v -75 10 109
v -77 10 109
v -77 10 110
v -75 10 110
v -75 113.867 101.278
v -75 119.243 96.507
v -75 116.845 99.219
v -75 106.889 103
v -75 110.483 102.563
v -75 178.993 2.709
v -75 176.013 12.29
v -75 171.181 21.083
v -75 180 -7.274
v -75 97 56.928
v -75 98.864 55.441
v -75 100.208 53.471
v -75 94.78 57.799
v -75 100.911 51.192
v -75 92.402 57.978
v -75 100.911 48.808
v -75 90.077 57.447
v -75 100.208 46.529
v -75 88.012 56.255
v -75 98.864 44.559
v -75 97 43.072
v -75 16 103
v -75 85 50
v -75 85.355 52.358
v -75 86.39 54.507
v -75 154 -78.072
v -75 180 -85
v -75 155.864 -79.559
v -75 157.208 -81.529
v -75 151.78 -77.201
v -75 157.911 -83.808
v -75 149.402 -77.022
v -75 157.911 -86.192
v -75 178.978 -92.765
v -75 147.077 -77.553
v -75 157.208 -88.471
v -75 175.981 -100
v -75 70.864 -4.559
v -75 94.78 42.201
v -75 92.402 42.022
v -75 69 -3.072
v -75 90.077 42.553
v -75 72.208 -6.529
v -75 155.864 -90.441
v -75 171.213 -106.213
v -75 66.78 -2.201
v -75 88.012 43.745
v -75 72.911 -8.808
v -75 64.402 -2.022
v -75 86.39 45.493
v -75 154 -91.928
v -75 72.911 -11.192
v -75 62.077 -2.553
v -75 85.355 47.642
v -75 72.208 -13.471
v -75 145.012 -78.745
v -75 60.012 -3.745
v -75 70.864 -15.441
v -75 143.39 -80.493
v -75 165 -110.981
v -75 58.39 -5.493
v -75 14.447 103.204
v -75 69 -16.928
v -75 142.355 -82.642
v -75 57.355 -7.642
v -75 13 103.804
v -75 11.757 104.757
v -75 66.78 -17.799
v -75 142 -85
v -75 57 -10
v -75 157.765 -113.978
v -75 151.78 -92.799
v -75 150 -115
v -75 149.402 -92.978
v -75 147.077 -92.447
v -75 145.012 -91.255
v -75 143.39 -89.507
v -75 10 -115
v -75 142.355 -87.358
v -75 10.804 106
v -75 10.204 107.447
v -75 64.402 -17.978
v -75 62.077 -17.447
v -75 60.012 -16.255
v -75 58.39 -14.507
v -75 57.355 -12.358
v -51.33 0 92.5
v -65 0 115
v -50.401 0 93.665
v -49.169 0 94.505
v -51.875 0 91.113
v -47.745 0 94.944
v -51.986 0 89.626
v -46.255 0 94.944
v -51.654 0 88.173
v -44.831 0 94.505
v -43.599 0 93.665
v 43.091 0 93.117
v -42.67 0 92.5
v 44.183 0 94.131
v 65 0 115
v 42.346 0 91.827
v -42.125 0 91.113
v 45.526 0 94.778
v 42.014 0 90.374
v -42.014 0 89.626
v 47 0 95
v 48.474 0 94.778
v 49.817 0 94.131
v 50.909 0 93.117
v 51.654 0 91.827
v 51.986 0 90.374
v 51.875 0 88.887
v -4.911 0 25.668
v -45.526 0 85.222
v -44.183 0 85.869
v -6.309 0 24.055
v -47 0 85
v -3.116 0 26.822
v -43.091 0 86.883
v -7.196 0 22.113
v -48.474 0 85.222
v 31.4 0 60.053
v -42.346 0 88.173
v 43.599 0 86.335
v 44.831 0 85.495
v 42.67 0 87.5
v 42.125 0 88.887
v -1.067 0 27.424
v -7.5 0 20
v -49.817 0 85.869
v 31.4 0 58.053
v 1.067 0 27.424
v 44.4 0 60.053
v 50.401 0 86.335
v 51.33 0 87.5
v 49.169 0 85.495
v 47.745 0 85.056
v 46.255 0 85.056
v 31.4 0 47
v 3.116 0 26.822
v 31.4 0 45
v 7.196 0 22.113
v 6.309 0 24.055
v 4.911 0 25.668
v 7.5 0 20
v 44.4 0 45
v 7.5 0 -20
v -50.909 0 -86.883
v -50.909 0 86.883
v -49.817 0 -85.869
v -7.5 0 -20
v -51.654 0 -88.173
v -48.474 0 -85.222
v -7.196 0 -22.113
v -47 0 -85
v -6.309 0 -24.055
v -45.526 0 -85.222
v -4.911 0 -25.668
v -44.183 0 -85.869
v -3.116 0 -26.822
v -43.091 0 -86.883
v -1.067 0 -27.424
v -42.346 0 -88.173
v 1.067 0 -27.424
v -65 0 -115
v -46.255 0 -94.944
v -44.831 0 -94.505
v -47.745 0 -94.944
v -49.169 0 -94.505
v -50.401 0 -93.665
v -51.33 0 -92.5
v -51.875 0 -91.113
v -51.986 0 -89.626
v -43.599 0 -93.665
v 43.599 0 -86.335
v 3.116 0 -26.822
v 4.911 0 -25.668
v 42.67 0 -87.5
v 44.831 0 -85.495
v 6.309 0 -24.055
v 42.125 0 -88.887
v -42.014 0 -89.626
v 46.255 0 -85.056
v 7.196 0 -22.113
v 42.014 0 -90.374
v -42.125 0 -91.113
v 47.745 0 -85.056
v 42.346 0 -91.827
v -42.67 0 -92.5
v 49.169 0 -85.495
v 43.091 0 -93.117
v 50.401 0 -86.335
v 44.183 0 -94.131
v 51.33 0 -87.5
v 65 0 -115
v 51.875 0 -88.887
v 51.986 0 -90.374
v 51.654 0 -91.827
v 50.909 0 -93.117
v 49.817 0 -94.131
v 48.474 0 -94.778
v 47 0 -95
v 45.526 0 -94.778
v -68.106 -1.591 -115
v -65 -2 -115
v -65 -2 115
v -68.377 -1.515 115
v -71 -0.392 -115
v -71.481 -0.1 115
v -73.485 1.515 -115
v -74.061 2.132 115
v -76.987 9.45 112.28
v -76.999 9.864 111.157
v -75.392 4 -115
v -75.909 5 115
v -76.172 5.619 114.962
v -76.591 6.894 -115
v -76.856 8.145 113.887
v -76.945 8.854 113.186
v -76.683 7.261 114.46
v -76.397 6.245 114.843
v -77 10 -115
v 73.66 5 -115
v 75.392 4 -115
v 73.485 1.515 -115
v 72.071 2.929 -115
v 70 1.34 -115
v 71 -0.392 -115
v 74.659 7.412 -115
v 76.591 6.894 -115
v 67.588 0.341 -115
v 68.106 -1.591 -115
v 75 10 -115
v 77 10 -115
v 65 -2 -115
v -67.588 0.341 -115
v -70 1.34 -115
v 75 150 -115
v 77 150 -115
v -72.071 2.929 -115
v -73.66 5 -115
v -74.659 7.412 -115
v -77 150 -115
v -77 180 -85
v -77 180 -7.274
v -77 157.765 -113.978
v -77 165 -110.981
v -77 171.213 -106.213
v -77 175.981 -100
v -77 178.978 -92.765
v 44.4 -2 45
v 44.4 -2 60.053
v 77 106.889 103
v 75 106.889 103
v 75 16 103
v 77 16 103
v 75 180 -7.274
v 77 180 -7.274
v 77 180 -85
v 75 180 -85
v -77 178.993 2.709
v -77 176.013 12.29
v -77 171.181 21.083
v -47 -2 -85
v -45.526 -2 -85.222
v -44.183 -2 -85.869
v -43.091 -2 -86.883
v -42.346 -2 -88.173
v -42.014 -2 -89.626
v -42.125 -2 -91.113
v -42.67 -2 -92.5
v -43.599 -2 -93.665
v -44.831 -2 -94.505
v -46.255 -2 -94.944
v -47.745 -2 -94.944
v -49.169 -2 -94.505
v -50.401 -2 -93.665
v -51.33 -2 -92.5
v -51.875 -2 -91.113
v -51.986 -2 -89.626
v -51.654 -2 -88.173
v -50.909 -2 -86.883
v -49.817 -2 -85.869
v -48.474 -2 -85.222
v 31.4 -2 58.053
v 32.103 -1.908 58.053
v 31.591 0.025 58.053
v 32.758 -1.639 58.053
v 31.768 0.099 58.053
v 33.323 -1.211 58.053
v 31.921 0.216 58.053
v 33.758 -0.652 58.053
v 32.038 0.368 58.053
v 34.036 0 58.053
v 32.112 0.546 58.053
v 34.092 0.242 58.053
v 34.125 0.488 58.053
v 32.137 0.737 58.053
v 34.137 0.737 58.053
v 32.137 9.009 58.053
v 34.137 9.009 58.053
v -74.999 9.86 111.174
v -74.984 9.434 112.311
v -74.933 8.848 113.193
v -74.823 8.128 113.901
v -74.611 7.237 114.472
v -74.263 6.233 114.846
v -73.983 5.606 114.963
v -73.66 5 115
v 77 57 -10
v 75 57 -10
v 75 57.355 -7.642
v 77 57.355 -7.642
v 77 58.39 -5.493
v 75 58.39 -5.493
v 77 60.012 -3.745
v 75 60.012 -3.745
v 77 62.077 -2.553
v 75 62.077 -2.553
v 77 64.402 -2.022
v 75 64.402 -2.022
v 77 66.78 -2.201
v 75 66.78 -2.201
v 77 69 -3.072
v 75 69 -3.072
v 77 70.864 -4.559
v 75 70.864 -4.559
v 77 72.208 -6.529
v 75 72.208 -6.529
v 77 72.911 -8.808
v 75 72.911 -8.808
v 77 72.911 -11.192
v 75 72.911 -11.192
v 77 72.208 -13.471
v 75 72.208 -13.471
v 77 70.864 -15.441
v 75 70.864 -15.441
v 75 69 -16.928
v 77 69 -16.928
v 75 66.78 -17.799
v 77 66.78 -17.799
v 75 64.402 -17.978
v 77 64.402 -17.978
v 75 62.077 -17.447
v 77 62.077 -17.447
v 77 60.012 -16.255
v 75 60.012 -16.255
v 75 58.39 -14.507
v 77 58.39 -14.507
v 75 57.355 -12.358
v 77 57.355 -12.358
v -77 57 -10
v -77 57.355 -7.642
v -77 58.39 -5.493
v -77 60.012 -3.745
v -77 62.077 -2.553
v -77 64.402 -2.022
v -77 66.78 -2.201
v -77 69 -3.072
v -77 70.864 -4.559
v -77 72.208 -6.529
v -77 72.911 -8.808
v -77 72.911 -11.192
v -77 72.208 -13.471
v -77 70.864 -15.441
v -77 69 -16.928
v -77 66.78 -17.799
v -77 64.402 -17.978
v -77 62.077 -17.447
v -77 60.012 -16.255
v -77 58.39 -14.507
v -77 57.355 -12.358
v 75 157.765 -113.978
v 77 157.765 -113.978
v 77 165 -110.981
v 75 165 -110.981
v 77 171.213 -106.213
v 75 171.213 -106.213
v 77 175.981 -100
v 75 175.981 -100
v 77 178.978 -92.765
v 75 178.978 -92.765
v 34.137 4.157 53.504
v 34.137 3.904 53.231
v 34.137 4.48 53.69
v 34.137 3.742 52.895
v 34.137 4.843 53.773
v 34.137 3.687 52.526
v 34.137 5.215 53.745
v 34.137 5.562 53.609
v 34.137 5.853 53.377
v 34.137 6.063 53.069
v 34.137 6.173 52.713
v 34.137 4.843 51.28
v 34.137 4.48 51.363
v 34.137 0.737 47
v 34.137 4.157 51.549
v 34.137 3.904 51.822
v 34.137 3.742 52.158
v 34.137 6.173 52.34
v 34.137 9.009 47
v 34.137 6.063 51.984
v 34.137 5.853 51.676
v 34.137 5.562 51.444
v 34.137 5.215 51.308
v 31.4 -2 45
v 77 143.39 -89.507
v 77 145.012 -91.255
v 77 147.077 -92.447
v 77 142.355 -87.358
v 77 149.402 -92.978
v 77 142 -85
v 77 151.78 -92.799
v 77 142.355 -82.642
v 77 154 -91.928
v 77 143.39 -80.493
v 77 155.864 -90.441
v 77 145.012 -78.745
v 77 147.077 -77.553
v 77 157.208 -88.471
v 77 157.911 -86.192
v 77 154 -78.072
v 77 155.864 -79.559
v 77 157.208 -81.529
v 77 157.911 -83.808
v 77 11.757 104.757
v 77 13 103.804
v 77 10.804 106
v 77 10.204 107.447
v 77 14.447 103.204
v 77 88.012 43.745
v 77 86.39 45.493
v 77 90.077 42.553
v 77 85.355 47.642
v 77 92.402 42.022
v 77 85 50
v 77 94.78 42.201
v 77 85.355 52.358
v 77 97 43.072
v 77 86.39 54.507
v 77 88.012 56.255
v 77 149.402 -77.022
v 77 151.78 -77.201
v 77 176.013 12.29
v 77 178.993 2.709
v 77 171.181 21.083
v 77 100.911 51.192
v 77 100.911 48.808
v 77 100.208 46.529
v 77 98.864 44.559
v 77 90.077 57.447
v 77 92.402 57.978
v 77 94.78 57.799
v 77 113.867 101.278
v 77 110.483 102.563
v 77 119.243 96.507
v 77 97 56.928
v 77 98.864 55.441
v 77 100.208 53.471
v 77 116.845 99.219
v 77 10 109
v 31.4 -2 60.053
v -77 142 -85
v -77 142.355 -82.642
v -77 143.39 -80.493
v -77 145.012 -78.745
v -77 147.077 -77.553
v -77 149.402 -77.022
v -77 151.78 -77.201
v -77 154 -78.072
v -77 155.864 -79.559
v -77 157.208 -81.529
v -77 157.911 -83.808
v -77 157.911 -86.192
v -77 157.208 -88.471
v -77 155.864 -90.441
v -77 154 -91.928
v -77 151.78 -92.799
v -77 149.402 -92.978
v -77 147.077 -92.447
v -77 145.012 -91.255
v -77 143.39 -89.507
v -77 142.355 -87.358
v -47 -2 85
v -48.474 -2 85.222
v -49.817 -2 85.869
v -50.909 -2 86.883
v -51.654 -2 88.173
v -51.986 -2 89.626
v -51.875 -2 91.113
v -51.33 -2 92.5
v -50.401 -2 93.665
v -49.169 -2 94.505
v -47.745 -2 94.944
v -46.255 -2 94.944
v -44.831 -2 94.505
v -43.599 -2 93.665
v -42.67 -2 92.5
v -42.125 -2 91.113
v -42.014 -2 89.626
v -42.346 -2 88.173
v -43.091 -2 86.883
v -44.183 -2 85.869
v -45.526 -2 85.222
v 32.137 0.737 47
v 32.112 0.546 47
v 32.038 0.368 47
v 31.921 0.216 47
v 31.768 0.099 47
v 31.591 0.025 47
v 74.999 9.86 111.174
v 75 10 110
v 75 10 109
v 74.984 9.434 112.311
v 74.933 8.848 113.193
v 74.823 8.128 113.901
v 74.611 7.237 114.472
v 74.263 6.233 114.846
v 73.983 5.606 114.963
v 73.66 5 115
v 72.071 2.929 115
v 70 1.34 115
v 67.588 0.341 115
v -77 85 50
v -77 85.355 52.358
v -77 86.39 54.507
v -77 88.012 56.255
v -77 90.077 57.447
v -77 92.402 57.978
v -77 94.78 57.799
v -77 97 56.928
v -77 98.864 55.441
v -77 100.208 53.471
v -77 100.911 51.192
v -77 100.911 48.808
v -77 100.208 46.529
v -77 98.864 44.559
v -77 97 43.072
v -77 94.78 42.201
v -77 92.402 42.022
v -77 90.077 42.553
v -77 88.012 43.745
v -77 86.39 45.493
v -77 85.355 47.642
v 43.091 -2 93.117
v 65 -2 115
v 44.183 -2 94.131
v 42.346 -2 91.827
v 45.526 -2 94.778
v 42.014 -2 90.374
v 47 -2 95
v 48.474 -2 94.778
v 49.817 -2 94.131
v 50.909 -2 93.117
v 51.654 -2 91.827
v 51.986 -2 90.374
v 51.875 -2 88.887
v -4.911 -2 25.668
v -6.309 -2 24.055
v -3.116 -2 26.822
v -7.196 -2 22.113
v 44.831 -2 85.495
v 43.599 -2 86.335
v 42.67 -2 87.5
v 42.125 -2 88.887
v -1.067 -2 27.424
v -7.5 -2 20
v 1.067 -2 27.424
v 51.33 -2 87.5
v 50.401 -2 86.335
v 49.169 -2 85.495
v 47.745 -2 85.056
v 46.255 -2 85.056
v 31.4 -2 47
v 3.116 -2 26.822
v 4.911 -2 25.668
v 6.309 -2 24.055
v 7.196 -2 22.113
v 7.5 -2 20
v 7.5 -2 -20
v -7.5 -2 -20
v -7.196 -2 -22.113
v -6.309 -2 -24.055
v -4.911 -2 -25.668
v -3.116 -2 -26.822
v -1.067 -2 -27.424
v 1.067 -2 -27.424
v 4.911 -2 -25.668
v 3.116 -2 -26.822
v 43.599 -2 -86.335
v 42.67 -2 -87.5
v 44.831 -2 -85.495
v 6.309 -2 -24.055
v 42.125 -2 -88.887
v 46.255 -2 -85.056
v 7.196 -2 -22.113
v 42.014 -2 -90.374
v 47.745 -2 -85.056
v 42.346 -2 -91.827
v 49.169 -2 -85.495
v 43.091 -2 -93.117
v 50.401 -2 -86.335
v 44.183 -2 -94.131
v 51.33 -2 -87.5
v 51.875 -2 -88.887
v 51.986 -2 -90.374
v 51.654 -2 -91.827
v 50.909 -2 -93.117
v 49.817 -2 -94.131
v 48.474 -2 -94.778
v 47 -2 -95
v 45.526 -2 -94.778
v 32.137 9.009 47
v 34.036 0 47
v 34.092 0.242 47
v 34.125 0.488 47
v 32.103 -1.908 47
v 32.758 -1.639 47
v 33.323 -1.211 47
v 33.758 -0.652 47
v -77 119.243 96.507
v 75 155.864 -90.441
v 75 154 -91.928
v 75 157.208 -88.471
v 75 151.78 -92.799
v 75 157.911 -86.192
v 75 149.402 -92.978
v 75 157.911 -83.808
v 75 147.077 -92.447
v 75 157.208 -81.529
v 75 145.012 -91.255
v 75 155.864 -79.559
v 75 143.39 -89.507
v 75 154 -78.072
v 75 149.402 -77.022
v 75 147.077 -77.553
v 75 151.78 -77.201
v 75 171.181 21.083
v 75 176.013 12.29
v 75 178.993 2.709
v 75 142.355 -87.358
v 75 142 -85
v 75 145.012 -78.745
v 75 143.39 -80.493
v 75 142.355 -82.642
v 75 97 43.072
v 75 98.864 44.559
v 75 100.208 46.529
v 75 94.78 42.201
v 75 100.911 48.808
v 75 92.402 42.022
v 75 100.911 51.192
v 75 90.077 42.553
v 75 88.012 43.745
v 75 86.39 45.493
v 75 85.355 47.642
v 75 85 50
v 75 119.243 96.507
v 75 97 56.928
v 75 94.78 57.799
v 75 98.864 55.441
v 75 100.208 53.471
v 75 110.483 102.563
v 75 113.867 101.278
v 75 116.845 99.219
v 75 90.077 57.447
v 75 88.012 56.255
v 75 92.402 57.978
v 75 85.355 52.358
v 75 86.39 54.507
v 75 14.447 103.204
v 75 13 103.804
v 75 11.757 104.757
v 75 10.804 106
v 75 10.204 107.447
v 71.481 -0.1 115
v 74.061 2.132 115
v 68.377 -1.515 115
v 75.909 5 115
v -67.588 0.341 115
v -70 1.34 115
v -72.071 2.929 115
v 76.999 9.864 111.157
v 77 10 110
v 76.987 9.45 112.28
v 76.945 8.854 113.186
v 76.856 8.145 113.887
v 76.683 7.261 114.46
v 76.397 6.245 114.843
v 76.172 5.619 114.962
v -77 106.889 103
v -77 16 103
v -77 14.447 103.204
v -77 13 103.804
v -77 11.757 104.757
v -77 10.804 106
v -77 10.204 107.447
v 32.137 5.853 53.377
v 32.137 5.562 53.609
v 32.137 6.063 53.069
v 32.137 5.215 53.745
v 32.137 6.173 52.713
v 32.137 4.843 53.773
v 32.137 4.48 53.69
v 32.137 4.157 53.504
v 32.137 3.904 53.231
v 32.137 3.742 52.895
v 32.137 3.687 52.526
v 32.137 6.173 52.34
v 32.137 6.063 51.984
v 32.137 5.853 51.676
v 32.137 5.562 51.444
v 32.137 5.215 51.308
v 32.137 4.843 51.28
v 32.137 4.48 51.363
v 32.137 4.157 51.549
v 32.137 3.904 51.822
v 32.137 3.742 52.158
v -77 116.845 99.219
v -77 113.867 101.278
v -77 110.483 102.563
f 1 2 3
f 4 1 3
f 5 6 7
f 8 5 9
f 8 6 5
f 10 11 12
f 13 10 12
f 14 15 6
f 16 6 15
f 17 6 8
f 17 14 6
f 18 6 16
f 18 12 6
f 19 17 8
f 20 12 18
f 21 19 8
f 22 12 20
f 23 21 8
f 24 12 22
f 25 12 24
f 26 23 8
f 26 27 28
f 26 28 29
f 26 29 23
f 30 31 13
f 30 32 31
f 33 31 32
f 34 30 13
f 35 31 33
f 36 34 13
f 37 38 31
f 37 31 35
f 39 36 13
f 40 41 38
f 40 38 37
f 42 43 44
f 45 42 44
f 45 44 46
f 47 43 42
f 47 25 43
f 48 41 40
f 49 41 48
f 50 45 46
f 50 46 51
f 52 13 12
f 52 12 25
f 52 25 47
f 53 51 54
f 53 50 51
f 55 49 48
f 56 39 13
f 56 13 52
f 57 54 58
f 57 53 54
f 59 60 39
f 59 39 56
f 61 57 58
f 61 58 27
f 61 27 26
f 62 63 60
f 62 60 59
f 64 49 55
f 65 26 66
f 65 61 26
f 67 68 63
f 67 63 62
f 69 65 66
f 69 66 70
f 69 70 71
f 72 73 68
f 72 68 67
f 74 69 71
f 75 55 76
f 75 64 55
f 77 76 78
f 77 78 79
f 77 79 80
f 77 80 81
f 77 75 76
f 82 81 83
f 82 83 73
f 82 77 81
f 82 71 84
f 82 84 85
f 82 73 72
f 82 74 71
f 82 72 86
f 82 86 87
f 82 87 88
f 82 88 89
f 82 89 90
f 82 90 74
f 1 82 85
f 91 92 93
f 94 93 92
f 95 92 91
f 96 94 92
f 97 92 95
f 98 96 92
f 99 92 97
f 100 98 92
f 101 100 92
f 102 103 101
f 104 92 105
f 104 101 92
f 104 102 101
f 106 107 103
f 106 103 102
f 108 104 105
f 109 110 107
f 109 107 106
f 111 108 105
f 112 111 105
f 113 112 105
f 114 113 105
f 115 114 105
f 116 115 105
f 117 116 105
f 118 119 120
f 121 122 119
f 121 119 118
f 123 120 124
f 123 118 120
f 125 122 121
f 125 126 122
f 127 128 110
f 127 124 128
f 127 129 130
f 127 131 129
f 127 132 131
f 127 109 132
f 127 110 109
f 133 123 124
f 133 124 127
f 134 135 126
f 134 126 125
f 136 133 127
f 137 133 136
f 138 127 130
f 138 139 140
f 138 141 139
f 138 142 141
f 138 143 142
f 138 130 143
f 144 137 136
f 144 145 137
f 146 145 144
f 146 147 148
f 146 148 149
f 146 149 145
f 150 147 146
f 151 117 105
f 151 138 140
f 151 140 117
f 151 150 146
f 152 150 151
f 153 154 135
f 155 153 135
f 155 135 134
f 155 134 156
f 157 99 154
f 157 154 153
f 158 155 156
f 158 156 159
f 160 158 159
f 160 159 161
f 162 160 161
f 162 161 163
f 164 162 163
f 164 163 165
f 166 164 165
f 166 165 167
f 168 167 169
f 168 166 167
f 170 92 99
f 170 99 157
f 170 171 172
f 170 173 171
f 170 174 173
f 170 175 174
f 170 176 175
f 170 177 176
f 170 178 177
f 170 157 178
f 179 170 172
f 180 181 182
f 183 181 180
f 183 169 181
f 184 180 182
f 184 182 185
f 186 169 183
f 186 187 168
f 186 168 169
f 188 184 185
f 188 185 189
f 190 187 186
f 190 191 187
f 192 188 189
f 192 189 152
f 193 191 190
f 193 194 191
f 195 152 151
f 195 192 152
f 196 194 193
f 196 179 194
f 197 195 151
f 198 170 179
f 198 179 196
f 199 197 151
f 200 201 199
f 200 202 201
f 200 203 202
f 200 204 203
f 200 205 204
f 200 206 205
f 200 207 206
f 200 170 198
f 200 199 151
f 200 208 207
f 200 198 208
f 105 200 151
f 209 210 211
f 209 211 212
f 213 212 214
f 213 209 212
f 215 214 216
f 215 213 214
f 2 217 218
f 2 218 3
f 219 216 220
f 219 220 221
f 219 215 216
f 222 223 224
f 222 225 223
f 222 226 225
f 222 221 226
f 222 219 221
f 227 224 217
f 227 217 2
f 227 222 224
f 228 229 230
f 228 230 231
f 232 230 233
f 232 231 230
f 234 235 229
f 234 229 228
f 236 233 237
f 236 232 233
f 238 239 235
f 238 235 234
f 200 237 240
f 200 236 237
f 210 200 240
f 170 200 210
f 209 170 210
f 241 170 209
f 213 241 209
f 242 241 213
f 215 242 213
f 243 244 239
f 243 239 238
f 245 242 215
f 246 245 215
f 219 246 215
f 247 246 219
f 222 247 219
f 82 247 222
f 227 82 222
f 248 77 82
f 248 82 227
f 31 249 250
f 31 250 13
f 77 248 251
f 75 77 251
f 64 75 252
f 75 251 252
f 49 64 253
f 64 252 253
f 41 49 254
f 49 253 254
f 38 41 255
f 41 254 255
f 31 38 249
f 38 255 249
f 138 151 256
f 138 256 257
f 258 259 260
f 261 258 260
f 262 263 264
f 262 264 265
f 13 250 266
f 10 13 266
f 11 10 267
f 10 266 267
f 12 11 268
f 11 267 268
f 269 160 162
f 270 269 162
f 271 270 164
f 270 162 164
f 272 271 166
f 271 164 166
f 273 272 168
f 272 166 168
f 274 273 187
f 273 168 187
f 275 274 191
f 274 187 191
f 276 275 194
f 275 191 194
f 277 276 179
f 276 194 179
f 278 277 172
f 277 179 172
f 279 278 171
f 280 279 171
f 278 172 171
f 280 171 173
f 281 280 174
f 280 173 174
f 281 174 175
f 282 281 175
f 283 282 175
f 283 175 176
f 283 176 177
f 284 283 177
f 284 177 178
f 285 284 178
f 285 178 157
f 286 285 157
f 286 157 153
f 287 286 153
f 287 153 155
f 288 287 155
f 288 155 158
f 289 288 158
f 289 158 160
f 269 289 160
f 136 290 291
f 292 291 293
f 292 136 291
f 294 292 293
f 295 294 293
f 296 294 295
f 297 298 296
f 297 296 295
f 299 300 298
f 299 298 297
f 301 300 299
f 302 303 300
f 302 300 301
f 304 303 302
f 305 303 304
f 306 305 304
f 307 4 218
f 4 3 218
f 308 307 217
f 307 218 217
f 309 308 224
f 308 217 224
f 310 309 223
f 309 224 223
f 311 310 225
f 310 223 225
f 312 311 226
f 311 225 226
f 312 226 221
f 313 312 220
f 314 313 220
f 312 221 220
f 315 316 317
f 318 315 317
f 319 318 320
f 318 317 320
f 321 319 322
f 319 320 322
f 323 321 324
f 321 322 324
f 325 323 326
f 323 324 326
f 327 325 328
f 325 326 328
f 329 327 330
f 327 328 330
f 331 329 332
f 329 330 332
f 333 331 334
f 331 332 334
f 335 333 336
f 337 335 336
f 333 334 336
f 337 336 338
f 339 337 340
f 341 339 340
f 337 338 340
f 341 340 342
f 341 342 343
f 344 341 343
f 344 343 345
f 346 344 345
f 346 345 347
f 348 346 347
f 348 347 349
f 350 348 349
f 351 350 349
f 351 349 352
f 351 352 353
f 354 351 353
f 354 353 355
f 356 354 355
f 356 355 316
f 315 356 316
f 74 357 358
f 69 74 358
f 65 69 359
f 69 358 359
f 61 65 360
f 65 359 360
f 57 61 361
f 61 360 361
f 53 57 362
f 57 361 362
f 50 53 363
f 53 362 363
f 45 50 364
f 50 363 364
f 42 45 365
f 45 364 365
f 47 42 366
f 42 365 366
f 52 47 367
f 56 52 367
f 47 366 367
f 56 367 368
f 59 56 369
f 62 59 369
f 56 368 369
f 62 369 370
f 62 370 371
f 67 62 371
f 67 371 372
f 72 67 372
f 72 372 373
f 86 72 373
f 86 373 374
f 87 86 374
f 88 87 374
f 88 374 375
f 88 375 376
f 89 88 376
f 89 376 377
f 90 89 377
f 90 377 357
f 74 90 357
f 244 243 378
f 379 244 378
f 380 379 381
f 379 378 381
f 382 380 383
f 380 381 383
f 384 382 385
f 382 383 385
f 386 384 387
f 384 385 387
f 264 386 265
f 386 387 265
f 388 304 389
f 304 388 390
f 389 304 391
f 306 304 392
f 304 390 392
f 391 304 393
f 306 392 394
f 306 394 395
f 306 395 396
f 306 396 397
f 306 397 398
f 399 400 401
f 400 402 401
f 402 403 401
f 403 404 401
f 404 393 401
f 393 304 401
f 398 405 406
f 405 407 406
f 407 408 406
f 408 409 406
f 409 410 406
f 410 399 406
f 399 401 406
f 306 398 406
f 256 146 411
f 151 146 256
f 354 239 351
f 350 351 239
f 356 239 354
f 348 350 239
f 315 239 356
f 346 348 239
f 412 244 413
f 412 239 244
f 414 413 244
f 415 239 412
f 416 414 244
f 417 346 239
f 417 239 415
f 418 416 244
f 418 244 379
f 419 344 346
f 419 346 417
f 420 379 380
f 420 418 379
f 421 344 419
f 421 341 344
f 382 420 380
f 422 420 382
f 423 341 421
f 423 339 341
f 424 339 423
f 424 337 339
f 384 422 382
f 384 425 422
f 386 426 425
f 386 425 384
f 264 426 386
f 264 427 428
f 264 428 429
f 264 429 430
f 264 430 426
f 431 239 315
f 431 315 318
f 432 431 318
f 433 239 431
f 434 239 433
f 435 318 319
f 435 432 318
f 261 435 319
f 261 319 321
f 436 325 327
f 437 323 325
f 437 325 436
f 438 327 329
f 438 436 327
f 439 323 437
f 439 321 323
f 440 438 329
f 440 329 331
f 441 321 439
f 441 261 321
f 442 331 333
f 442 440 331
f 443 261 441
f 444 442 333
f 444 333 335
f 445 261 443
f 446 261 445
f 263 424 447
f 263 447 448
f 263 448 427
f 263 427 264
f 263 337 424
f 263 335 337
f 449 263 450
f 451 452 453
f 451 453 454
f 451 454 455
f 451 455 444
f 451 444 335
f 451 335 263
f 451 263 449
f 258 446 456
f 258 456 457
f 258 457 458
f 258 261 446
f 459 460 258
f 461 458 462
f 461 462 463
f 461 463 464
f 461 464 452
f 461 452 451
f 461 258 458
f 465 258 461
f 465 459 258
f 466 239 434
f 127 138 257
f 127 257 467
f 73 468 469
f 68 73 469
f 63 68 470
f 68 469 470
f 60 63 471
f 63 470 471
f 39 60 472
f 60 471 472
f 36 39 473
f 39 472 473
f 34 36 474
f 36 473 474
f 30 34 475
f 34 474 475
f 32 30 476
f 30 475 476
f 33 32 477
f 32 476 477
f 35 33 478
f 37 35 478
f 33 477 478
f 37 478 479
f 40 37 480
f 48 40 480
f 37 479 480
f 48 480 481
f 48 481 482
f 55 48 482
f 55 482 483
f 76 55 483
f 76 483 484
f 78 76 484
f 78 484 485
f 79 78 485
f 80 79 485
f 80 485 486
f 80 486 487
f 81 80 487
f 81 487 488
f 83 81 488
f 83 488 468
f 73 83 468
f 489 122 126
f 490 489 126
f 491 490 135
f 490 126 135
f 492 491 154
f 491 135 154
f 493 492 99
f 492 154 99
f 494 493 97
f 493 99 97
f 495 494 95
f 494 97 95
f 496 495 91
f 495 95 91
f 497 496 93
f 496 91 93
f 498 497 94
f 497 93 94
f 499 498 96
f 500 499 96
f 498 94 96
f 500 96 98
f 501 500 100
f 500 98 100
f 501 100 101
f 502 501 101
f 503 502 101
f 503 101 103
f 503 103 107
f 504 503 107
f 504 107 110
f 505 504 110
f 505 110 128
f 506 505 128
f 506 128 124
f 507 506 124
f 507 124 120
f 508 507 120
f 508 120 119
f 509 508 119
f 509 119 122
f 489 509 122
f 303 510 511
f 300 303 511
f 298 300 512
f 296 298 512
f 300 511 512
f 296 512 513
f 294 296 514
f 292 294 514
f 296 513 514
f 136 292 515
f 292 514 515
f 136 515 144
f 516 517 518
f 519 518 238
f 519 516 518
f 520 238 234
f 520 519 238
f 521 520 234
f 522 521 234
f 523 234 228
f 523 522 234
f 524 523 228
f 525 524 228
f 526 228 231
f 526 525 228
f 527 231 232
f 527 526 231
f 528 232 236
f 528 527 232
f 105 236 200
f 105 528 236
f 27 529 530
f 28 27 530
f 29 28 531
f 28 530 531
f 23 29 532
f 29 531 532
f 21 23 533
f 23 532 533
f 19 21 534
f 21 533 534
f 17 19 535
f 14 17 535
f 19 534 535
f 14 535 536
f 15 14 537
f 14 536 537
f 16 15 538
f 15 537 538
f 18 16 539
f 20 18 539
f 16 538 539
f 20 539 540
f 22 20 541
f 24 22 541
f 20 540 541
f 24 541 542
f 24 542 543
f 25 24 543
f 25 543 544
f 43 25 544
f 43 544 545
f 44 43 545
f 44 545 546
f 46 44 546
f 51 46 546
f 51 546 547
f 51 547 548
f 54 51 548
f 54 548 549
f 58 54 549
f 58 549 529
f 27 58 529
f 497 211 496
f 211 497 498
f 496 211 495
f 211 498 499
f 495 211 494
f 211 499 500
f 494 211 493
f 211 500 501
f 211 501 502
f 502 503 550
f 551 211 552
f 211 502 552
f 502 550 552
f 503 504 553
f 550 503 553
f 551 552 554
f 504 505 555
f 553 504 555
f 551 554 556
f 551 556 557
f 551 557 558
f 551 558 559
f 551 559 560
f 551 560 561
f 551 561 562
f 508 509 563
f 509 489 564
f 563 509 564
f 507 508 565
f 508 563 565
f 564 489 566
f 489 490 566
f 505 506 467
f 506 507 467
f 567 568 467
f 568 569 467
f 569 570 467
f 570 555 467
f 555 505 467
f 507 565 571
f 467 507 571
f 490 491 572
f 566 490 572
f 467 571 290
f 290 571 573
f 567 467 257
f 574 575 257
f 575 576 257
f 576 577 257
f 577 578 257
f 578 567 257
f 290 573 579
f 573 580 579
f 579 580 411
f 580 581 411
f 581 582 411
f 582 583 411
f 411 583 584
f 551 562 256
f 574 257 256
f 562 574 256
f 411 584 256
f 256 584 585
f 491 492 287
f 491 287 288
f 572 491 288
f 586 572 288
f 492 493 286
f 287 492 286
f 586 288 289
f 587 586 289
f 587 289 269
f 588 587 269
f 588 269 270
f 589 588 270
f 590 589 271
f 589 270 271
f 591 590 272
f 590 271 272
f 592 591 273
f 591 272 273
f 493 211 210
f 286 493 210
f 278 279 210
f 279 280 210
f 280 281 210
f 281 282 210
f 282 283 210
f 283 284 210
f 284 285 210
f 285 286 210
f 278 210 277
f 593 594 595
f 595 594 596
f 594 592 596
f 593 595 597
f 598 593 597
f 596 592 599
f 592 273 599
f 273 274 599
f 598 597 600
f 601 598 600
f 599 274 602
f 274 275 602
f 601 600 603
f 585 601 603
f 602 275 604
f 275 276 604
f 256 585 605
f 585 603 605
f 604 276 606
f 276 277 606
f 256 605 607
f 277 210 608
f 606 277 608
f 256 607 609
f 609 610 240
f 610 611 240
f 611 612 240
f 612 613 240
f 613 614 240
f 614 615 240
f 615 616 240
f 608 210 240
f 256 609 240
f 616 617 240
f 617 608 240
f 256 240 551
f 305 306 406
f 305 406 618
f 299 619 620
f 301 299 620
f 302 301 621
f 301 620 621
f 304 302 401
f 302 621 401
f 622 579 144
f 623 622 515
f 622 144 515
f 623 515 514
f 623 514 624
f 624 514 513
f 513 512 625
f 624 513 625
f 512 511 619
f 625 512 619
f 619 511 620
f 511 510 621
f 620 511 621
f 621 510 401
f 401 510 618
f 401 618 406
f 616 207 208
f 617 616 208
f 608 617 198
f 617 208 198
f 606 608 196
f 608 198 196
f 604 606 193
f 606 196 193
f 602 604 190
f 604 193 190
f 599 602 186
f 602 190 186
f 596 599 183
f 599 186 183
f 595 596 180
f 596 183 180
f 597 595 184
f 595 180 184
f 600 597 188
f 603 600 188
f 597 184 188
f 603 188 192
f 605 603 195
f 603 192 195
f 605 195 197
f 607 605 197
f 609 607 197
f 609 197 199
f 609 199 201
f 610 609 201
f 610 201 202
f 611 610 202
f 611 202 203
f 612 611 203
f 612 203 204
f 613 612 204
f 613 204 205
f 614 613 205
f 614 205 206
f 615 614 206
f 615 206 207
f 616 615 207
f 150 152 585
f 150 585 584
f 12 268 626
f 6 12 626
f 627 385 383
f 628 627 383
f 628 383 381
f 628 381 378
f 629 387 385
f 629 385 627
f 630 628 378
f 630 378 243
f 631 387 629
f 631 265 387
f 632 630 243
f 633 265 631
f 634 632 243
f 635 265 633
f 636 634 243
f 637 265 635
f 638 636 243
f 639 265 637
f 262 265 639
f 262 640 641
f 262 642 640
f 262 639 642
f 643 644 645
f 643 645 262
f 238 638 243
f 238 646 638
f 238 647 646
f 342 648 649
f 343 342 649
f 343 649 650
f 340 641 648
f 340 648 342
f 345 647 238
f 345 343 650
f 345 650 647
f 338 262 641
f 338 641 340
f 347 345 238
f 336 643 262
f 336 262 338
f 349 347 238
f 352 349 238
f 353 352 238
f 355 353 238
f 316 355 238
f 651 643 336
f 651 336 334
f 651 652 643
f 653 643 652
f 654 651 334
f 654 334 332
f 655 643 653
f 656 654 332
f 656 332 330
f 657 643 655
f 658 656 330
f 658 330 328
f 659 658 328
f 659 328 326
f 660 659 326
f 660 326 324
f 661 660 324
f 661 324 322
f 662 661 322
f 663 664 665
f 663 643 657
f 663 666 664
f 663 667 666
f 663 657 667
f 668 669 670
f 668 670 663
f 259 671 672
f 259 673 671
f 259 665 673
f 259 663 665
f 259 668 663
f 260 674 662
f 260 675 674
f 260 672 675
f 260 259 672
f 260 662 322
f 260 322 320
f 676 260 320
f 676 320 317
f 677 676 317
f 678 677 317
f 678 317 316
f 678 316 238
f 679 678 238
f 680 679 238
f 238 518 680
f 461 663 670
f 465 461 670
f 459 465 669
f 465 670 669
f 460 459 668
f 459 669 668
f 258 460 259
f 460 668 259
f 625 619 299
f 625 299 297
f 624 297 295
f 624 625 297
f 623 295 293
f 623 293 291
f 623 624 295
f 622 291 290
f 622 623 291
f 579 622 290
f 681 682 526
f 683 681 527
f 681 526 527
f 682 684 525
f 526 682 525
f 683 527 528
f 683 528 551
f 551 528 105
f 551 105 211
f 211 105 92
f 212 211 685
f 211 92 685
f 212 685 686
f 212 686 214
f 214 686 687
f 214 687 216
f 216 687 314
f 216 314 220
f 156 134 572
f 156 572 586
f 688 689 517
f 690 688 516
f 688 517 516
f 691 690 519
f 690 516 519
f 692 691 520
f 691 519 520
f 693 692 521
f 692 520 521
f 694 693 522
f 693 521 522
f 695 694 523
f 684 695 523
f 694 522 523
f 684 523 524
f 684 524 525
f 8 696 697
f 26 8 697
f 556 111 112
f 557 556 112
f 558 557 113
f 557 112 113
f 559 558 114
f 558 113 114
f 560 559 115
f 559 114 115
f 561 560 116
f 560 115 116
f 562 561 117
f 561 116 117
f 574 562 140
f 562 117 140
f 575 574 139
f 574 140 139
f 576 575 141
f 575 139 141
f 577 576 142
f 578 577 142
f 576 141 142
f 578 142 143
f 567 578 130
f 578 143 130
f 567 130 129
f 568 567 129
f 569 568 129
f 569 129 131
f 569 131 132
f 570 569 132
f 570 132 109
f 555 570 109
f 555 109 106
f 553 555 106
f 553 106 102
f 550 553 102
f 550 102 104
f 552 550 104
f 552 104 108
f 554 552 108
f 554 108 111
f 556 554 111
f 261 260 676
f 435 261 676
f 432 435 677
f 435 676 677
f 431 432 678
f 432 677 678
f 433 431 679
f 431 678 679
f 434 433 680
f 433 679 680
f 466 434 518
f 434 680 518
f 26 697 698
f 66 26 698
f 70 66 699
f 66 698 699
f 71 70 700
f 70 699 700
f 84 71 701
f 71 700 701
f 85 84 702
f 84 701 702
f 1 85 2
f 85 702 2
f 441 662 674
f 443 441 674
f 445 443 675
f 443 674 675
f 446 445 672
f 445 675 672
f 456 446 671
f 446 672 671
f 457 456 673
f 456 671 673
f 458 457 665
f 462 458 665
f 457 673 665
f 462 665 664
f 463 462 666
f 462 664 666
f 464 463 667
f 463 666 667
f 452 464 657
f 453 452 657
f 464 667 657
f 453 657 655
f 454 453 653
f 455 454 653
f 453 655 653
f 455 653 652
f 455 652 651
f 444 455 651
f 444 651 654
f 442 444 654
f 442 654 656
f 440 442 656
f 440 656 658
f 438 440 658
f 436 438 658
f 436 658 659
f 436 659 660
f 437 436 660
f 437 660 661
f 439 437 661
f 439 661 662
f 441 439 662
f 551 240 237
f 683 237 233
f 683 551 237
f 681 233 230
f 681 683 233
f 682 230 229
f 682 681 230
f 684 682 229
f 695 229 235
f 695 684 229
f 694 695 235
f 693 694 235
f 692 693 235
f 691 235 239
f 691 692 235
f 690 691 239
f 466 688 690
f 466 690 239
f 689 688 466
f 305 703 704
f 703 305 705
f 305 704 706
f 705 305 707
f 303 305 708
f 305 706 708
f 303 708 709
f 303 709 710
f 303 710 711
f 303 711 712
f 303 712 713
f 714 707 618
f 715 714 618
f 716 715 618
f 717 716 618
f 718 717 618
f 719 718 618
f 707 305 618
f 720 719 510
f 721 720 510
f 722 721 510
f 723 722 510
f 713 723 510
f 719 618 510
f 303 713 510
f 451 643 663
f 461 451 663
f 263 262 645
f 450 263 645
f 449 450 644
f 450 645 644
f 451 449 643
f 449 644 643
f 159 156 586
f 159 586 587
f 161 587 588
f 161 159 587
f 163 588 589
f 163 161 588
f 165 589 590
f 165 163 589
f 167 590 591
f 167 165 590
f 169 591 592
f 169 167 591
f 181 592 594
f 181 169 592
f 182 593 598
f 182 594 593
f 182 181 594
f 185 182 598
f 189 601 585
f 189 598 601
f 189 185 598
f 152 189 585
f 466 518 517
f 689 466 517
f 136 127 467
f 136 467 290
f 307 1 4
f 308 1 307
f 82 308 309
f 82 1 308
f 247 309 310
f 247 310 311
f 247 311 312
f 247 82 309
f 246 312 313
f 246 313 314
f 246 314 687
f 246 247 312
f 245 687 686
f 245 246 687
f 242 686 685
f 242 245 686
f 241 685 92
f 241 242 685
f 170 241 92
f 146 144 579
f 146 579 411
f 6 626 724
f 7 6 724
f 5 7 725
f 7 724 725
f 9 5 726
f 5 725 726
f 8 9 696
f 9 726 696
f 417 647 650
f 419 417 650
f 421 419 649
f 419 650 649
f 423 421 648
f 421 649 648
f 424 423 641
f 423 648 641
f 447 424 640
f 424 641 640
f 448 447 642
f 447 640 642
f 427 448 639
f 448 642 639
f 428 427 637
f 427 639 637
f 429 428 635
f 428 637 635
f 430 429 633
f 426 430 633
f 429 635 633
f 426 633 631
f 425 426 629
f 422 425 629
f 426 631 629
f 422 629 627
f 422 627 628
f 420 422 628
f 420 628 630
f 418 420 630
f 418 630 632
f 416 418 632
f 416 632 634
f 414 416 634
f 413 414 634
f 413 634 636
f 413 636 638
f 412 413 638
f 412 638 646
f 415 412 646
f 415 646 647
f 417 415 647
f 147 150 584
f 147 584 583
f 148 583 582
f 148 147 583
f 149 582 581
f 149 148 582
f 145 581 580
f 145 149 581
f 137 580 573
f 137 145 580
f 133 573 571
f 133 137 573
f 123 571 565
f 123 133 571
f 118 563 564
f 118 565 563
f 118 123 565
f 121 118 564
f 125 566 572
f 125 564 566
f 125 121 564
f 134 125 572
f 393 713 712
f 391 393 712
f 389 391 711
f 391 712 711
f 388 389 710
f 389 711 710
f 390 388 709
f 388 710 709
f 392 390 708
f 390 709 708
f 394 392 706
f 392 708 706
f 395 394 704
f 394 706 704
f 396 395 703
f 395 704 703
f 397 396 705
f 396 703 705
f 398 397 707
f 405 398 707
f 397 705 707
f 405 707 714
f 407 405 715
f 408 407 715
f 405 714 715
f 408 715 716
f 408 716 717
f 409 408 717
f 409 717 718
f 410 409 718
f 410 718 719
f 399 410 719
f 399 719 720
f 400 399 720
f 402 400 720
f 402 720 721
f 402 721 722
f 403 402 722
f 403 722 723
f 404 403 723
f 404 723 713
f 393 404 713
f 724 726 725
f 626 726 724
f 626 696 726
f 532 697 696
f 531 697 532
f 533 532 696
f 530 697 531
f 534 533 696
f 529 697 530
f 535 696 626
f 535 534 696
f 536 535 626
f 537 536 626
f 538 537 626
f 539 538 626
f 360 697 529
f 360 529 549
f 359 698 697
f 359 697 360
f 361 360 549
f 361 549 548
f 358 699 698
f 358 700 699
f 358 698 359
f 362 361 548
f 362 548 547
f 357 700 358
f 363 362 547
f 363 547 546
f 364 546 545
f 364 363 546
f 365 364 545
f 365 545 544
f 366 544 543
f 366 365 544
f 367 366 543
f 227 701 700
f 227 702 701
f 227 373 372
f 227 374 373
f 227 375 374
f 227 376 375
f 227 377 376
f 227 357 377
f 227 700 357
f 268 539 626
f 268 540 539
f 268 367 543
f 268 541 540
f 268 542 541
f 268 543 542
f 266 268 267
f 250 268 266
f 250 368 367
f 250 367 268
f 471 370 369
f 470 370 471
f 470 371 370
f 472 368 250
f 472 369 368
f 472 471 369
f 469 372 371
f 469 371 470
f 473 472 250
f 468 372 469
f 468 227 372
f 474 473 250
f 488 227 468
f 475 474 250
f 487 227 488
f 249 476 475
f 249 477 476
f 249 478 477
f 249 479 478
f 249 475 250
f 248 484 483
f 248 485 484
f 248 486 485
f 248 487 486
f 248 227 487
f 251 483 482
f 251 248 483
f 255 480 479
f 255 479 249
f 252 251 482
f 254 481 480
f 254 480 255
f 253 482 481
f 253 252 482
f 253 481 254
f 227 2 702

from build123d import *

# Parameters (mm, degrees)
SKETCH1_W                      = 150
SKETCH1_H                      = 230
BASE_FLANGE1_DEPTH             = 2
EDGE_FLANGE1_STRIP_W           = 28
EDGE_FLANGE1_STRIP_H           = 2
EDGE_FLANGE1_STRIP_CUT_DEPTH   = 230
EDGE_FLANGE1_STRIP_2_W         = 28
EDGE_FLANGE1_STRIP_2_H         = 2
EDGE_FLANGE1_STRIP_CUT_2_DEPTH = 230
EDGE_FLANGE1_DEPTH             = 230
EDGE_FLANGE1_BEND_DEPTH        = 230
SKETCH15_OUTSIDE_W             = 298.254
SKETCH15_OUTSIDE_H             = 250.254
SKETCH15_OUTSIDE_R             = 8
CUT_EXTRUDE1_DEPTH             = 264.326793168
SKETCH16_R                     = 5
CUT_EXTRUDE2_DEPTH             = 228.055059487
CUT_EXTRUDE3_DEPTH             = 228.055059487
SKETCHED_START                 = 47
SKETCHED_BEND1_DEPTH           = 11.052994728
SKETCHED_BEND1_2_DEPTH         = 11.052994728
CUT_EXTRUDE4_REACH             = 241.866
SKETCH20_R                     = 1.25


# Read off the part's stored shape, not the designer's step: Sketched Bend1
# Sheet-metal steps are written as plain solids
with BuildPart() as part:
    # Sketch1 → Base-Flange1 (new body)
    with BuildSketch(Plane(origin=(0, 0, 0), x_dir=(1, 0, 0), z_dir=(0, 1, 0))):
        Rectangle(SKETCH1_W, SKETCH1_H)
    extrude(amount=-BASE_FLANGE1_DEPTH)

    # Edge-Flange1 strip (across the edge) → Edge-Flange1 strip cut (cut)
    with BuildSketch(Plane(origin=(75, 0, 115), x_dir=(-1, 0, 0), z_dir=(0, 0, -1))):
        with Locations((-4, -1)):
            Rectangle(EDGE_FLANGE1_STRIP_W, EDGE_FLANGE1_STRIP_H)
    extrude(amount=EDGE_FLANGE1_STRIP_CUT_DEPTH, mode=Mode.SUBTRACT)

    # Edge-Flange1 strip 2 (across the edge) → Edge-Flange1 strip cut 2 (cut)
    with BuildSketch(Plane(origin=(-75, 0, -115), x_dir=(1, 0, 0), z_dir=(0, 0, 1))):
        with Locations((-4, -1)):
            Rectangle(EDGE_FLANGE1_STRIP_2_W, EDGE_FLANGE1_STRIP_2_H)
    extrude(amount=EDGE_FLANGE1_STRIP_CUT_2_DEPTH, mode=Mode.SUBTRACT)

    # Edge-Flange1 section (across the edge) → Edge-Flange1 (add)
    with BuildSketch(Plane(origin=(75, 0, 115), x_dir=(-1, 0, 0), z_dir=(0, 0, -1))):
        with BuildLine():
            Line((-2, 10), (-2, 180))
            Line((-2, 180), (0, 180))
            Line((0, 180), (0, 10))
            ThreePointArc((0, 10), (2.928932188, 2.928932188), (10, 0))
            Line((10, 0), (10, -2))
            ThreePointArc((10, -2), (1.514718626, 1.514718626), (-2, 10))
        make_face()
    extrude(amount=EDGE_FLANGE1_DEPTH)

    # Edge-Flange1 section 2 (across the edge) → Edge-Flange1 bend (add)
    with BuildSketch(Plane(origin=(-75, 0, -115), x_dir=(1, 0, 0), z_dir=(0, 0, 1))):
        with BuildLine():
            Line((-2, 10), (-2, 180))
            Line((-2, 180), (0, 180))
            Line((0, 180), (0, 10))
            ThreePointArc((0, 10), (2.928932188, 2.928932188), (10, 0))
            Line((10, 0), (10, -2))
            ThreePointArc((10, -2), (1.514718626, 1.514718626), (-2, 10))
        make_face()
    extrude(amount=EDGE_FLANGE1_BEND_DEPTH)

    # Sketch15 outside → Cut-Extrude1 (cut, through all)
    # profile 1 of 4: a face of its own
    with BuildSketch(Plane.ZY.offset(77)):
        with Locations((0, 89)):
            Rectangle(SKETCH15_OUTSIDE_W, SKETCH15_OUTSIDE_H)
        with BuildLine():
            Line((21.083470393, 171.180744276), (96.507242037, 119.243178795))
            ThreePointArc((96.507242037, 119.243178795), (101.277963521, 113.867184852), (103, 106.888955512))
            Line((103, 106.888955512), (103, 16))
            ThreePointArc((103, 16), (104.757359313, 11.757359313), (109, 10))
            Line((109, 10), (110, 10))
            ThreePointArc((110, 10), (113.535533906, 8.535533906), (115, 5))
            Line((115, 5), (115, -2))
            Line((115, -2), (-115, -2))
            Line((-115, -2), (-115, 99))
            Line((-115, 99), (-115, 150))
            ThreePointArc((-115, 150), (-106.213203436, 171.213203436), (-85, 180))
            Line((-85, 180), (-49, 180))
            Line((-49, 180), (-7.274003064, 180))
            ThreePointArc((-7.274003064, 180), (7.574612801, 177.744304445), (21.083470393, 171.180744276))
        make_face(mode=Mode.SUBTRACT)
    # profile 2 of 4: a face of its own
    with BuildSketch(Plane.ZY.offset(77)):
        with Locations(Location((50, 93, 0), (0, 0, 270))):
            Circle(SKETCH15_OUTSIDE_R)
    # profile 3 of 4: a face of its own
    with BuildSketch(Plane.ZY.offset(77)):
        with Locations(Location((-85, 150, 0), (0, 0, 270))):
            Circle(SKETCH15_OUTSIDE_R)
    # profile 4 of 4: a face of its own
    with BuildSketch(Plane.ZY.offset(77)):
        with Locations(Location((-10, 65, 0), (0, 0, 270))):
            Circle(SKETCH15_OUTSIDE_R)
    extrude(amount=-CUT_EXTRUDE1_DEPTH, mode=Mode.SUBTRACT)

    # Sketch16 → Cut-Extrude2 (cut, through all)
    with BuildSketch(Plane(origin=(0, 0, 0), x_dir=(1, 0, 0), z_dir=(0, 1, 0))):
        with Locations(Location((-47, 90, 0), (0, 0, 270))):
            Circle(SKETCH16_R)
        with Locations(Location((47, 90, 0), (0, 0, 90))):
            Circle(SKETCH16_R)
        with Locations(Location((47, -90, 0), (0, 0, 270))):
            Circle(SKETCH16_R)
        with Locations(Location((-47, -90, 0), (0, 0, 90))):
            Circle(SKETCH16_R)
        with BuildLine():
            Line((7.5, 20), (7.5, -20))
            ThreePointArc((7.5, -20), (0, -27.5), (-7.5, -20))
            Line((-7.5, -20), (-7.5, 20))
            ThreePointArc((-7.5, 20), (0, 27.5), (7.5, 20))
        make_face()
    extrude(amount=-CUT_EXTRUDE2_DEPTH, mode=Mode.SUBTRACT)

    # Sketch18 → Cut-Extrude3 (cut, through all)
    with BuildSketch(Plane(origin=(0, 0, 0), x_dir=(1, 0, 0), z_dir=(0, 1, 0))):
        Polygon((31.4, -45), (44.4, -45), (44.4, -60.052994728), (31.4, -60.052994728), (31.4, -58.052994728), (42.4, -58.052994728), (42.4, -47), (31.4, -47), align=None)
    extrude(amount=-CUT_EXTRUDE3_DEPTH, mode=Mode.SUBTRACT)

    # Sketched Bend1 outline → Sketched Bend1 (cut)
    with BuildSketch(Plane.XY.offset(SKETCHED_START)):
        with BuildLine():
            ThreePointArc((34.035602398, 0), (33.054267209, -1.443395312), (31.4, -2))
            Line((31.4, -2), (42.4, -2))
            Line((42.4, -2), (42.4, 0))
            Line((42.4, 0), (34.035602398, 0))
        make_face()
    extrude(amount=SKETCHED_BEND1_DEPTH, mode=Mode.SUBTRACT)

    # Sketched Bend1 2 outline → Sketched Bend1 2 (add)
    with BuildSketch(Plane.XY.offset(SKETCHED_START)):
        with BuildLine():
            Line((31.4, 0), (34.035602398, 0))
            ThreePointArc((34.035602398, 0), (34.111233029, 0.364854094), (34.1366, 0.7366))
            Line((34.1366, 0.7366), (34.1366, 9.008755099))
            Line((34.1366, 9.008755099), (32.1366, 9.008755099))
            Line((32.1366, 9.008755099), (32.1366, 0.7366))
            ThreePointArc((32.1366, 0.7366), (31.920854855, 0.215745145), (31.4, 0))
        make_face()
    extrude(amount=SKETCHED_BEND1_2_DEPTH)

    # Sketch20 → Cut-Extrude4 (cut, up to next)
    with BuildSketch(Plane.ZY.offset(-32.1366), mode=Mode.PRIVATE) as cut_extrude4_sk1:
        with Locations(Location((52.526497364, 4.9366, 0), (0, 0, 270))):
            Circle(SKETCH20_R)
    cut_extrude4_tool1 = extrude(cut_extrude4_sk1.sketch, amount=-CUT_EXTRUDE4_REACH, mode=Mode.PRIVATE) & part.part
    add(cut_extrude4_tool1.solids().sort_by_distance((32.1366, 4.9366, 52.526497))[0], mode=Mode.SUBTRACT)


solid = part.part
